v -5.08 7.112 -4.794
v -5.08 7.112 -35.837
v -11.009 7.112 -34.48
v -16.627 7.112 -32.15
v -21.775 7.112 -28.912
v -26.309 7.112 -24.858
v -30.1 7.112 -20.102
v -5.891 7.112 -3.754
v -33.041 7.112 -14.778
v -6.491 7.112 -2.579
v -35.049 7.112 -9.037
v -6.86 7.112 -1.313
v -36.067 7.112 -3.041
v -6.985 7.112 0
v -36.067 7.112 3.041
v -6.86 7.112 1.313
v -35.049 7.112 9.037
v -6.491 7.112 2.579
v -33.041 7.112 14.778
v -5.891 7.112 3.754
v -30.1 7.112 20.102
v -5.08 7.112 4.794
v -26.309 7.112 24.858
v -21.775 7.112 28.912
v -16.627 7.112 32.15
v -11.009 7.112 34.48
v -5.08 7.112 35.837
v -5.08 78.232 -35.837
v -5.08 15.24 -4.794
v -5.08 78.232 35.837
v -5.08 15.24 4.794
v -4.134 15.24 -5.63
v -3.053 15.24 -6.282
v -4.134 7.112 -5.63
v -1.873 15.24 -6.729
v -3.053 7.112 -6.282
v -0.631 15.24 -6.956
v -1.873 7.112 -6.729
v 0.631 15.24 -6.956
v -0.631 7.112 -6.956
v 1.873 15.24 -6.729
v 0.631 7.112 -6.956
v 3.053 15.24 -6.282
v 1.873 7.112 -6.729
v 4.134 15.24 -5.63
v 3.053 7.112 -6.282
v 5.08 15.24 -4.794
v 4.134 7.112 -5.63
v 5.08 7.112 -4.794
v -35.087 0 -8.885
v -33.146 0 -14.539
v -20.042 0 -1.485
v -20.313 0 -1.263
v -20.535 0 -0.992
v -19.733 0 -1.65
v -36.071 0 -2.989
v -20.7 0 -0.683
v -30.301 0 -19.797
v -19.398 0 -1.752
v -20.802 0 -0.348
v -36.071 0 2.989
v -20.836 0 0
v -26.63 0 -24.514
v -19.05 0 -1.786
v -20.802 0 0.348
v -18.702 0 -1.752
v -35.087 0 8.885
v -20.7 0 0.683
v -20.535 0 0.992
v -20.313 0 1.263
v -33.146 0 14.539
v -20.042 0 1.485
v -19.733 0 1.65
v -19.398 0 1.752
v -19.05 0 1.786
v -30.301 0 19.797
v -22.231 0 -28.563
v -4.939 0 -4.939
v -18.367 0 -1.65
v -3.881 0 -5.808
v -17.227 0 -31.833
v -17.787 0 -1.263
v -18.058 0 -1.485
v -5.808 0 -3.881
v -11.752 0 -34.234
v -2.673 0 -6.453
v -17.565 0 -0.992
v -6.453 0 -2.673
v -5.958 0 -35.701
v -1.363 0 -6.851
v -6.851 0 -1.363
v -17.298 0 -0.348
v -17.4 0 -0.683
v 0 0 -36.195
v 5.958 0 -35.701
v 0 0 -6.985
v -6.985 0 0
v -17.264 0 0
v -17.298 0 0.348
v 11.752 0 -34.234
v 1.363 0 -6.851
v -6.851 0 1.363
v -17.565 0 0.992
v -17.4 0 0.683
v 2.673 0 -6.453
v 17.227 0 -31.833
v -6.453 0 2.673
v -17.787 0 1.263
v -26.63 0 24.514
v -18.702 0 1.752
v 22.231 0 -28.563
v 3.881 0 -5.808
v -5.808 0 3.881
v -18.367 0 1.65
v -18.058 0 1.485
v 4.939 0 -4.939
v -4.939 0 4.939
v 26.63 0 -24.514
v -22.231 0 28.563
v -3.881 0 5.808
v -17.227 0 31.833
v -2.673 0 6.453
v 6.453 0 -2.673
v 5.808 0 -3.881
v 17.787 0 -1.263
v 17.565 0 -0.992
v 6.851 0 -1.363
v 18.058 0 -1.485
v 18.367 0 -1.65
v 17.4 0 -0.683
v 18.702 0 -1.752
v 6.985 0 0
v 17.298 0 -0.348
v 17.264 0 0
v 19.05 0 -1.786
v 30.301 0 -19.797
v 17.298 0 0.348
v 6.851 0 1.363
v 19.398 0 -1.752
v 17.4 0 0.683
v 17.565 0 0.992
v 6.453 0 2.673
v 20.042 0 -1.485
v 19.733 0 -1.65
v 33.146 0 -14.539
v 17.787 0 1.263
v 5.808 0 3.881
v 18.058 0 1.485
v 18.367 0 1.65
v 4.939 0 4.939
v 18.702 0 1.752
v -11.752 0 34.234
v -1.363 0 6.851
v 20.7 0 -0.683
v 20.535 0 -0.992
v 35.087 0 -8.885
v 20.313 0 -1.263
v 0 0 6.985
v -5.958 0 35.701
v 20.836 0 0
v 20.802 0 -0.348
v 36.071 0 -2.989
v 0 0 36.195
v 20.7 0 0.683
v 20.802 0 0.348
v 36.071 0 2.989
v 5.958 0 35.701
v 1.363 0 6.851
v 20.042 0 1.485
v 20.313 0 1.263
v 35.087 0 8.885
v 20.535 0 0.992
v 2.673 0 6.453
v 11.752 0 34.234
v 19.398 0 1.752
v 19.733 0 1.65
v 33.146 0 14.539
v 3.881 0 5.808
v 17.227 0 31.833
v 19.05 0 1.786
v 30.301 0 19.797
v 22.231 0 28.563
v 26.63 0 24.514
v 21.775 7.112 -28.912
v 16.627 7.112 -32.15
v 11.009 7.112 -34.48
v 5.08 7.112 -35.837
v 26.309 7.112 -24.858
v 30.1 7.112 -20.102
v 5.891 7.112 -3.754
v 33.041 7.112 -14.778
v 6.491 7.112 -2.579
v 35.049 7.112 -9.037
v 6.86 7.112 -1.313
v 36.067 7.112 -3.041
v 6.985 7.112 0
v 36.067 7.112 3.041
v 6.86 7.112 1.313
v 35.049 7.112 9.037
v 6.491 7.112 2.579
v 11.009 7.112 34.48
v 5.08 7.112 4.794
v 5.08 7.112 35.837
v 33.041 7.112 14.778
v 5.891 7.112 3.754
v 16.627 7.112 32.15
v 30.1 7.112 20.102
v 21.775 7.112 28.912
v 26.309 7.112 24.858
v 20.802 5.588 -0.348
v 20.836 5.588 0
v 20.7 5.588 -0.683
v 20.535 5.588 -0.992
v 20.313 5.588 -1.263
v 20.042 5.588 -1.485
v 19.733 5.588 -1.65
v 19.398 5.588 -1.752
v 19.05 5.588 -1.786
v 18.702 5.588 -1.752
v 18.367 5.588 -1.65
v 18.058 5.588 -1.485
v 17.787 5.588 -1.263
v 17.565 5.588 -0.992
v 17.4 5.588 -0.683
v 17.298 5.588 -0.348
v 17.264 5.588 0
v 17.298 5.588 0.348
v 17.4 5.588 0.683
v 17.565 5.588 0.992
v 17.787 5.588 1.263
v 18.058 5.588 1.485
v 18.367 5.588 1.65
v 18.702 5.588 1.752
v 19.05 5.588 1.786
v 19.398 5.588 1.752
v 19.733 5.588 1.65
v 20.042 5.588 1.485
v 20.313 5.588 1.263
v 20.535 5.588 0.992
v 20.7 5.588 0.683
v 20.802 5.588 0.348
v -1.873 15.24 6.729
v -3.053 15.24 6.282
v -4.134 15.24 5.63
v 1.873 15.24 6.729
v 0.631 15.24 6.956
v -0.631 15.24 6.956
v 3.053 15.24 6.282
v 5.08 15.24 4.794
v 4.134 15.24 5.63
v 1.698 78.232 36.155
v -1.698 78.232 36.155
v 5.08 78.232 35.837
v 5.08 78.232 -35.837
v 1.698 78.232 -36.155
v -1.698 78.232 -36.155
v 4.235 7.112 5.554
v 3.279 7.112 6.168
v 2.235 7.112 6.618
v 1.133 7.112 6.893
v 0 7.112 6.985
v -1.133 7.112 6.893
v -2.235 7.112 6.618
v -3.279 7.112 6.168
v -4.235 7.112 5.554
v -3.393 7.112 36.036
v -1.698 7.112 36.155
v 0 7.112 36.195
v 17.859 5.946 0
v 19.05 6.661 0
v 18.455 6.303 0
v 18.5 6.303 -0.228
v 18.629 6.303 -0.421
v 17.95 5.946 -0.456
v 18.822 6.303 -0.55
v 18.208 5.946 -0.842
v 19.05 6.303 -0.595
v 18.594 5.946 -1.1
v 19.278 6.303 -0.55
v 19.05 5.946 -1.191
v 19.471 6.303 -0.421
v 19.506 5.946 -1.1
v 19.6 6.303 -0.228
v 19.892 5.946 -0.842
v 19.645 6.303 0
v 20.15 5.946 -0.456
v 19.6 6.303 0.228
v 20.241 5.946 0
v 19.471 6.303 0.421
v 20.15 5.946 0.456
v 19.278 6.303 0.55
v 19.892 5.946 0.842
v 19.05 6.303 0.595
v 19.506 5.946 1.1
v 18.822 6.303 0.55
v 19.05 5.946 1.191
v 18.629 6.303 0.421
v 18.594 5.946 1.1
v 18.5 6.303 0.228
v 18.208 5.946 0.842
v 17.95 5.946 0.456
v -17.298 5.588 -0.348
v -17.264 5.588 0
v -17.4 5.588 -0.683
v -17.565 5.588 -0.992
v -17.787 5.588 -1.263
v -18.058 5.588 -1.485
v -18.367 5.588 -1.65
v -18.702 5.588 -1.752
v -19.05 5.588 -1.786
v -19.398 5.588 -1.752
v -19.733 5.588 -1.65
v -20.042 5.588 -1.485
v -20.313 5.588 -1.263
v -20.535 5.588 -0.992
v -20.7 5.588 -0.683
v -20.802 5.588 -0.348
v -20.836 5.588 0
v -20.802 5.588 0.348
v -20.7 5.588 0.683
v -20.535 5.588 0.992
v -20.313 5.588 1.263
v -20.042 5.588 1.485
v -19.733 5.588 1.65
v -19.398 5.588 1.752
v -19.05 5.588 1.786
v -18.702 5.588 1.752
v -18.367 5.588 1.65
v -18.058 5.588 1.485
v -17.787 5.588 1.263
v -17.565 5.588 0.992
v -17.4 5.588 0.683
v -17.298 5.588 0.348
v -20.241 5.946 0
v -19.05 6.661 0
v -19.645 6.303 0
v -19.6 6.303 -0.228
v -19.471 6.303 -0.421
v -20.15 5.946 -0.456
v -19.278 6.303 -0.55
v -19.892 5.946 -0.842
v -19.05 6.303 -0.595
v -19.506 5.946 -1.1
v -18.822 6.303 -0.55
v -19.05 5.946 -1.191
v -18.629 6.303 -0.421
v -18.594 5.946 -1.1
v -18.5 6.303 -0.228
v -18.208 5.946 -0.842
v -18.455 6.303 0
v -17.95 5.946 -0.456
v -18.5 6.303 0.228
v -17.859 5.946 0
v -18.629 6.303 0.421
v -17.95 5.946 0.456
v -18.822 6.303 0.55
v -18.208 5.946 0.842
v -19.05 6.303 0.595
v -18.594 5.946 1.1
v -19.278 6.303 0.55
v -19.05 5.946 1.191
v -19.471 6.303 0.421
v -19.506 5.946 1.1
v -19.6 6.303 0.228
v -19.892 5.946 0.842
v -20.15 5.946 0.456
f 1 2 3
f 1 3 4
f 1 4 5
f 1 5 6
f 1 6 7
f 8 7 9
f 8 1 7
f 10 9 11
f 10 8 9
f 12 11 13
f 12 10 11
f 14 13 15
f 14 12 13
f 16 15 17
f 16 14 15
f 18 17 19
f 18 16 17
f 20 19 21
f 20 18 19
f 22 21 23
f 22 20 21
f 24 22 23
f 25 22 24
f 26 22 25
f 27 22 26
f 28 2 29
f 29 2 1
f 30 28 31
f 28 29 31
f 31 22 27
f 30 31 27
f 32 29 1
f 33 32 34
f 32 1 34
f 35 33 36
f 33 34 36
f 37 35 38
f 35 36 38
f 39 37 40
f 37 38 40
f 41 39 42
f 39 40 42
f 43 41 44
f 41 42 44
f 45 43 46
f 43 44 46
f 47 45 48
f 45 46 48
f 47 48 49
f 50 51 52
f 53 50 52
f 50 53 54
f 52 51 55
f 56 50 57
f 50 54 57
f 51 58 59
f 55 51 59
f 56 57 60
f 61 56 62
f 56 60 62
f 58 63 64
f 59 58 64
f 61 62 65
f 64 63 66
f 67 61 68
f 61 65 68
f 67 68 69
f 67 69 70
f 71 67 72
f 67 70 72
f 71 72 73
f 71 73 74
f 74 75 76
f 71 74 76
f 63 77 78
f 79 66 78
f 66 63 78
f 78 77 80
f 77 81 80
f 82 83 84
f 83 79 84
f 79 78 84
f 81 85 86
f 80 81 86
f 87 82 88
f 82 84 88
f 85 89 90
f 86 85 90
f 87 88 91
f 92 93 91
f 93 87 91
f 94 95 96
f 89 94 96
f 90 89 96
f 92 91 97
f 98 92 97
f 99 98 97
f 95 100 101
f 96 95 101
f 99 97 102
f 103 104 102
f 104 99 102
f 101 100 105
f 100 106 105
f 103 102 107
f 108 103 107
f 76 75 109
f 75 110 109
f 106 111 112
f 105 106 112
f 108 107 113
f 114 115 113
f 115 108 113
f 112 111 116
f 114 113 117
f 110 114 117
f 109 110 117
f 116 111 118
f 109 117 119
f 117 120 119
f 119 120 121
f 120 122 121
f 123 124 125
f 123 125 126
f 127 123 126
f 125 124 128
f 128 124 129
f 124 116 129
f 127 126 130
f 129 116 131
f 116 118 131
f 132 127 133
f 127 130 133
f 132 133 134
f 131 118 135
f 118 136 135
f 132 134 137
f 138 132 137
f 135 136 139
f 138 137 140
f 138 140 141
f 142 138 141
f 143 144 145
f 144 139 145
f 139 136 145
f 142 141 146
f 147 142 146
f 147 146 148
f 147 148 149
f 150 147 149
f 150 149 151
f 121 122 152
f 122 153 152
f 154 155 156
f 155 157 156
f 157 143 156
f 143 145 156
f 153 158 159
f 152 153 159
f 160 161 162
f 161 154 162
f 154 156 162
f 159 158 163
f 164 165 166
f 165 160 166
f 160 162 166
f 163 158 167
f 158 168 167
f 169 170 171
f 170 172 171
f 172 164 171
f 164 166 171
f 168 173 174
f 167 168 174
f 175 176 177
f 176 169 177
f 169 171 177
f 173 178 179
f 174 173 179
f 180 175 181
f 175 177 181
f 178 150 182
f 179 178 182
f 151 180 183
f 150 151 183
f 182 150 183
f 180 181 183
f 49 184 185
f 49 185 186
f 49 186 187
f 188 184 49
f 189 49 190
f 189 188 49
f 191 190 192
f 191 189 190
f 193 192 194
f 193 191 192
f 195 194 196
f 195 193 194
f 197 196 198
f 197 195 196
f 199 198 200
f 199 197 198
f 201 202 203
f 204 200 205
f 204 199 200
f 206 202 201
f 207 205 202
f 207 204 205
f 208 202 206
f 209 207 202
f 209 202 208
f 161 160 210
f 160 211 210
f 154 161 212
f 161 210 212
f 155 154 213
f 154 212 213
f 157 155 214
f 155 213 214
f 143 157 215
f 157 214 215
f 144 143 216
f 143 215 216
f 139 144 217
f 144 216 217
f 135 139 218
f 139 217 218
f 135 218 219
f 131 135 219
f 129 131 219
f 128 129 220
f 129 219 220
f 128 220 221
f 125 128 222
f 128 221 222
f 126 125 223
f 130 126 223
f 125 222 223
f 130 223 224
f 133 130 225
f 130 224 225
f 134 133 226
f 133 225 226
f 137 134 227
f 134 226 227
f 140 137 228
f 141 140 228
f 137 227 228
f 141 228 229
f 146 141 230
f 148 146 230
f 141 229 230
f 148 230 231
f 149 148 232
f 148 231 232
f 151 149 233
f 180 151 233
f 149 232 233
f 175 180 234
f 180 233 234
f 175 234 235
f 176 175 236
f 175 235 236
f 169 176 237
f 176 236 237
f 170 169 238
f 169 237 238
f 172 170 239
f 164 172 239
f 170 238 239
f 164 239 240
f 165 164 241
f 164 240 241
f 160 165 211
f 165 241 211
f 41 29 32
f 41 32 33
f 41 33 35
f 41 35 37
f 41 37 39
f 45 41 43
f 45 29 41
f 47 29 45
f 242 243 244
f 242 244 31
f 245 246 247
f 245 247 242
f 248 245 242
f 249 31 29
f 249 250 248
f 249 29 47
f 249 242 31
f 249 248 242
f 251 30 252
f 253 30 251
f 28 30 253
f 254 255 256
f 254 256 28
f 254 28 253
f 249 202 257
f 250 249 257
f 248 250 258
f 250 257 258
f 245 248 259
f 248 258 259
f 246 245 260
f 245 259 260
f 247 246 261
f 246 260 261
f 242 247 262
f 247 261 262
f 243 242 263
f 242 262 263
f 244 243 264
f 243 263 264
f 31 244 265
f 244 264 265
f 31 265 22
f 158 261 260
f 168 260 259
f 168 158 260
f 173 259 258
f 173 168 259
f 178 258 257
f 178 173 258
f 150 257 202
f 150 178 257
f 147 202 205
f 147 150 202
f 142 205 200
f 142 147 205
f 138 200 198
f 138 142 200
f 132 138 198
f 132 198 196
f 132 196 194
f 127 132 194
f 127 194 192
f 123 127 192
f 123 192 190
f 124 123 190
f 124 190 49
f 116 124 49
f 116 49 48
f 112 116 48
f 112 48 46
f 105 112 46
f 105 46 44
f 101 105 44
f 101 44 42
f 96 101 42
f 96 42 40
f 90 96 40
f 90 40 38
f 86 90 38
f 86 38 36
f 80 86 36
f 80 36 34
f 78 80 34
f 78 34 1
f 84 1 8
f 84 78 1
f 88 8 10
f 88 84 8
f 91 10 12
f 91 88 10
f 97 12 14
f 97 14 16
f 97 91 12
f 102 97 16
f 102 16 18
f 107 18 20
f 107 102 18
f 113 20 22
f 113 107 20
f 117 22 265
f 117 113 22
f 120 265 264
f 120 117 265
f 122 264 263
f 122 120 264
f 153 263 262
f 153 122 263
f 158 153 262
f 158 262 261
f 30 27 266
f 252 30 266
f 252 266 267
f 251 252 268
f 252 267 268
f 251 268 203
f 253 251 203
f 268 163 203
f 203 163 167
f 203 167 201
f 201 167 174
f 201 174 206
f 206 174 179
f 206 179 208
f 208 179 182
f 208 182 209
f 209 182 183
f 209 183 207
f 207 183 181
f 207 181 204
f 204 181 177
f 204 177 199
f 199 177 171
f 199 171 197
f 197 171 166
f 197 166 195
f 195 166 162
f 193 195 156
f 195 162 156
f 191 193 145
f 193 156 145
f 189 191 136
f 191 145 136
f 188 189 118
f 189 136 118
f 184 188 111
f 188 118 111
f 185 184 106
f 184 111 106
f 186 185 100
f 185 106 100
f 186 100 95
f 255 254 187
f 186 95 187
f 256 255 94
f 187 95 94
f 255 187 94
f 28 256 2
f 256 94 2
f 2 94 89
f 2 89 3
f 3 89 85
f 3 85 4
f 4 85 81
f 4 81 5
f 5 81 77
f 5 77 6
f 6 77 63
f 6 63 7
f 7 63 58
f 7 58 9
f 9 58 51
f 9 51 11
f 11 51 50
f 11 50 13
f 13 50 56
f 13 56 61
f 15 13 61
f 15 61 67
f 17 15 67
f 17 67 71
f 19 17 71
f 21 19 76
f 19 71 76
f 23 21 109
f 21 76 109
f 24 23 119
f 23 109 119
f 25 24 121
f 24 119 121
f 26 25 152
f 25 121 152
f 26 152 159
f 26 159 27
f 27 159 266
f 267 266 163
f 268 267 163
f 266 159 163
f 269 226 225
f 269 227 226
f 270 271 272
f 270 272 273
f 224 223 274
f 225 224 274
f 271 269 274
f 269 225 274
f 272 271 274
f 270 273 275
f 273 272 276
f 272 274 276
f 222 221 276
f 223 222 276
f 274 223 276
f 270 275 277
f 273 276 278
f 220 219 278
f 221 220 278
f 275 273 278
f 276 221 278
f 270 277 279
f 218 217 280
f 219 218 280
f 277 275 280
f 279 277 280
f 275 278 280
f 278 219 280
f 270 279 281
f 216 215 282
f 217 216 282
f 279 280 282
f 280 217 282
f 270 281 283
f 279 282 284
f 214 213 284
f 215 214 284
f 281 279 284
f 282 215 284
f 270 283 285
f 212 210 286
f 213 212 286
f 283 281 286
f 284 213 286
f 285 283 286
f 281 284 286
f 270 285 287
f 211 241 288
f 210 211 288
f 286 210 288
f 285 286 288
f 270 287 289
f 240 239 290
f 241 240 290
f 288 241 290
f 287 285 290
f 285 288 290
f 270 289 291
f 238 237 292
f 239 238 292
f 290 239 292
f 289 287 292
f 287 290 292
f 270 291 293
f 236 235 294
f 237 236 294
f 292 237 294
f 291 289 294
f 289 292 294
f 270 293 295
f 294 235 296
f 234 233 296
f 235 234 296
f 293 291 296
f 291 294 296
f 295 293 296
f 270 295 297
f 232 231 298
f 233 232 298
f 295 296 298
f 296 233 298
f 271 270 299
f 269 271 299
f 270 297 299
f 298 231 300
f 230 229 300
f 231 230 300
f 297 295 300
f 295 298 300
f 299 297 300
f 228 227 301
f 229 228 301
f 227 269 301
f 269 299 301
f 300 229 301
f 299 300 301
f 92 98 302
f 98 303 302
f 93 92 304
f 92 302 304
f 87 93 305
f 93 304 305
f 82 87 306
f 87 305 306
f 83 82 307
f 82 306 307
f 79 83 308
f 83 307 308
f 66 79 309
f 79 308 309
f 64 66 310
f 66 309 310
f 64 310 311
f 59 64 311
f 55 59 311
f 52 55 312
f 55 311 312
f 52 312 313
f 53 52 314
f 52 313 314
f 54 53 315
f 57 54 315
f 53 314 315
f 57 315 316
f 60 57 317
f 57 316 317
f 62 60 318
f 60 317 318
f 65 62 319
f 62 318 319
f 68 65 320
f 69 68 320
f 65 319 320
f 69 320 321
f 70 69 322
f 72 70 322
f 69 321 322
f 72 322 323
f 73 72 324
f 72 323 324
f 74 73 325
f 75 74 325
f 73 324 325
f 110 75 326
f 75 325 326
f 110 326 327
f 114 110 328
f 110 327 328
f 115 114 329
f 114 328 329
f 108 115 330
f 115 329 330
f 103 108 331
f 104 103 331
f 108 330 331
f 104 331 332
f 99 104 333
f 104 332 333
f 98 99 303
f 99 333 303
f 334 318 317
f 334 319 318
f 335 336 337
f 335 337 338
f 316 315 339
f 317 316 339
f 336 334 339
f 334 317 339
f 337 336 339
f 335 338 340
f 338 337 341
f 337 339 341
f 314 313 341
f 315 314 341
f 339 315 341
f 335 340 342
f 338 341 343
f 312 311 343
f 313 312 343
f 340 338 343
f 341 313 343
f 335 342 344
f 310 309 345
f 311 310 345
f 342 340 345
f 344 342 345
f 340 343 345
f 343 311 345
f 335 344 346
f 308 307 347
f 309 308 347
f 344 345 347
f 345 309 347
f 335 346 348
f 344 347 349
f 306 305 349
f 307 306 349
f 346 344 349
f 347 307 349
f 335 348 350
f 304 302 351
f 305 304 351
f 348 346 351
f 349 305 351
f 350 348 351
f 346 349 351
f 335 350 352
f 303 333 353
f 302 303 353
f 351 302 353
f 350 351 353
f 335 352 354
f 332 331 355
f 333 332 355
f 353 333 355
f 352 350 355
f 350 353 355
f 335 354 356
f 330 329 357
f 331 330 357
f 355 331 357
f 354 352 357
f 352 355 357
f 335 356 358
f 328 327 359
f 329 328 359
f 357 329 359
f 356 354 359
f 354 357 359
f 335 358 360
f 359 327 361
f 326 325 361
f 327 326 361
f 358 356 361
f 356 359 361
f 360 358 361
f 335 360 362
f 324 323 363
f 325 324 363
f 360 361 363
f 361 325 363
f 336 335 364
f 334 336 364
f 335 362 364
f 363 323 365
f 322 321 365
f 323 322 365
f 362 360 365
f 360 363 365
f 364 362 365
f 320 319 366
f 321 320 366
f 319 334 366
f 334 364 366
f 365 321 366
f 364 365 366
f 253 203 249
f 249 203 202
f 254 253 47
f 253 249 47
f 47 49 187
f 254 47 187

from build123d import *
from build123d.topology import SkipClean

# Parameters (mm, degrees)
SKETCH1_R                           = 36.195
SKETCH1_R_2                         = 6.985
BOSS_EXTRUDE1_DEPTH                 = 7.112
BOSS_EXTRUDE2_DEPTH                 = 71.12
CUT_EXTRUDE1_DEPTH                  = 8.128
F_9_64_0_14063_DIAMETER_HOLE2_D     = 3.572002
F_9_64_0_14063_DIAMETER_HOLE2_DEPTH = 5.588
F_9_64_0_14063_DIAMETER_HOLE2_TIP   = 1.073137666


with BuildPart() as part:
    # Sketch1 → Boss-Extrude1 (new body)
    with BuildSketch(Plane(origin=(0, 0, 0), x_dir=(1, 0, 0), z_dir=(0, 1, 0))):
        with Locations(Location((0, 0, 0), (0, 0, 270))):
            Circle(SKETCH1_R)
        with Locations(Location((0, 0, 0), (0, 0, 270))):
            Circle(SKETCH1_R_2, mode=Mode.SUBTRACT)
    extrude(amount=BOSS_EXTRUDE1_DEPTH)

    # Sketch7 → Boss-Extrude2 (add)
    with BuildSketch(Plane(origin=(0, 7.112, 0), x_dir=(1, 0, 0), z_dir=(0, 1, 0))):
        with BuildLine():
            ThreePointArc((5.08, -4.794144866), (0, -6.985), (-5.08, -4.794144866))
            Line((-5.08, -4.794144866), (-5.08, -35.836735691))
            ThreePointArc((-5.08, -35.836735691), (0, -36.195), (5.08, -35.836735691))
            Line((5.08, -35.836735691), (5.08, -4.794144866))
        make_face()
        with BuildLine():
            Line((-5.08, 35.836735691), (-5.08, 4.794144866))
            ThreePointArc((-5.08, 4.794144866), (0, 6.985), (5.08, 4.794144866))
            Line((5.08, 4.794144866), (5.08, 35.836735691))
            ThreePointArc((5.08, 35.836735691), (0, 36.195), (-5.08, 35.836735691))
        make_face()
        with BuildLine():
            Line((-5.08, 4.794144866), (-5.08, 0))
            Line((-5.08, 0), (5.08, 0))
            Line((5.08, 0), (5.08, 4.794144866))
            ThreePointArc((5.08, 4.794144866), (0, 6.985), (-5.08, 4.794144866))
        make_face()
        with BuildLine():
            Line((5.08, 0), (-5.08, 0))
            Line((-5.08, 0), (-5.08, -4.794144866))
            ThreePointArc((-5.08, -4.794144866), (0, -6.985), (5.08, -4.794144866))
            Line((5.08, -4.794144866), (5.08, 0))
        make_face()
    extrude(amount=BOSS_EXTRUDE2_DEPTH)

    # Sketch11 → Cut-Extrude1 (cut)
    with SkipClean():  # the faces are left unmerged after this step: merging them gives an invalid solid
        with BuildSketch(Plane.XZ.offset(-7.112)):
            with BuildLine():
                Line((-5.08, 4.794144866), (-5.08, -4.794144866))
                ThreePointArc((-5.08, -4.794144866), (0, -6.985), (5.08, -4.794144866))
                Line((5.08, -4.794144866), (5.08, 4.794144866))
                ThreePointArc((5.08, 4.794144866), (0, 6.985), (-5.08, 4.794144866))
            make_face()
        extrude(amount=-CUT_EXTRUDE1_DEPTH, mode=Mode.SUBTRACT)

    # 9/64 (0.14063) Diameter Hole2
    with Locations(Plane(origin=(0, 0, 0), x_dir=(-1, 0, 0), z_dir=(0, -1, 0))):
        with Locations((-19.05, 0), (19.05, 0)):
            Hole(F_9_64_0_14063_DIAMETER_HOLE2_D / 2, depth=F_9_64_0_14063_DIAMETER_HOLE2_DEPTH)
            with Locations((0, 0, -(F_9_64_0_14063_DIAMETER_HOLE2_DEPTH + F_9_64_0_14063_DIAMETER_HOLE2_TIP / 2))):  # 118° drill point
                Cone(0, F_9_64_0_14063_DIAMETER_HOLE2_D / 2, F_9_64_0_14063_DIAMETER_HOLE2_TIP, mode=Mode.SUBTRACT)


solid = part.part
